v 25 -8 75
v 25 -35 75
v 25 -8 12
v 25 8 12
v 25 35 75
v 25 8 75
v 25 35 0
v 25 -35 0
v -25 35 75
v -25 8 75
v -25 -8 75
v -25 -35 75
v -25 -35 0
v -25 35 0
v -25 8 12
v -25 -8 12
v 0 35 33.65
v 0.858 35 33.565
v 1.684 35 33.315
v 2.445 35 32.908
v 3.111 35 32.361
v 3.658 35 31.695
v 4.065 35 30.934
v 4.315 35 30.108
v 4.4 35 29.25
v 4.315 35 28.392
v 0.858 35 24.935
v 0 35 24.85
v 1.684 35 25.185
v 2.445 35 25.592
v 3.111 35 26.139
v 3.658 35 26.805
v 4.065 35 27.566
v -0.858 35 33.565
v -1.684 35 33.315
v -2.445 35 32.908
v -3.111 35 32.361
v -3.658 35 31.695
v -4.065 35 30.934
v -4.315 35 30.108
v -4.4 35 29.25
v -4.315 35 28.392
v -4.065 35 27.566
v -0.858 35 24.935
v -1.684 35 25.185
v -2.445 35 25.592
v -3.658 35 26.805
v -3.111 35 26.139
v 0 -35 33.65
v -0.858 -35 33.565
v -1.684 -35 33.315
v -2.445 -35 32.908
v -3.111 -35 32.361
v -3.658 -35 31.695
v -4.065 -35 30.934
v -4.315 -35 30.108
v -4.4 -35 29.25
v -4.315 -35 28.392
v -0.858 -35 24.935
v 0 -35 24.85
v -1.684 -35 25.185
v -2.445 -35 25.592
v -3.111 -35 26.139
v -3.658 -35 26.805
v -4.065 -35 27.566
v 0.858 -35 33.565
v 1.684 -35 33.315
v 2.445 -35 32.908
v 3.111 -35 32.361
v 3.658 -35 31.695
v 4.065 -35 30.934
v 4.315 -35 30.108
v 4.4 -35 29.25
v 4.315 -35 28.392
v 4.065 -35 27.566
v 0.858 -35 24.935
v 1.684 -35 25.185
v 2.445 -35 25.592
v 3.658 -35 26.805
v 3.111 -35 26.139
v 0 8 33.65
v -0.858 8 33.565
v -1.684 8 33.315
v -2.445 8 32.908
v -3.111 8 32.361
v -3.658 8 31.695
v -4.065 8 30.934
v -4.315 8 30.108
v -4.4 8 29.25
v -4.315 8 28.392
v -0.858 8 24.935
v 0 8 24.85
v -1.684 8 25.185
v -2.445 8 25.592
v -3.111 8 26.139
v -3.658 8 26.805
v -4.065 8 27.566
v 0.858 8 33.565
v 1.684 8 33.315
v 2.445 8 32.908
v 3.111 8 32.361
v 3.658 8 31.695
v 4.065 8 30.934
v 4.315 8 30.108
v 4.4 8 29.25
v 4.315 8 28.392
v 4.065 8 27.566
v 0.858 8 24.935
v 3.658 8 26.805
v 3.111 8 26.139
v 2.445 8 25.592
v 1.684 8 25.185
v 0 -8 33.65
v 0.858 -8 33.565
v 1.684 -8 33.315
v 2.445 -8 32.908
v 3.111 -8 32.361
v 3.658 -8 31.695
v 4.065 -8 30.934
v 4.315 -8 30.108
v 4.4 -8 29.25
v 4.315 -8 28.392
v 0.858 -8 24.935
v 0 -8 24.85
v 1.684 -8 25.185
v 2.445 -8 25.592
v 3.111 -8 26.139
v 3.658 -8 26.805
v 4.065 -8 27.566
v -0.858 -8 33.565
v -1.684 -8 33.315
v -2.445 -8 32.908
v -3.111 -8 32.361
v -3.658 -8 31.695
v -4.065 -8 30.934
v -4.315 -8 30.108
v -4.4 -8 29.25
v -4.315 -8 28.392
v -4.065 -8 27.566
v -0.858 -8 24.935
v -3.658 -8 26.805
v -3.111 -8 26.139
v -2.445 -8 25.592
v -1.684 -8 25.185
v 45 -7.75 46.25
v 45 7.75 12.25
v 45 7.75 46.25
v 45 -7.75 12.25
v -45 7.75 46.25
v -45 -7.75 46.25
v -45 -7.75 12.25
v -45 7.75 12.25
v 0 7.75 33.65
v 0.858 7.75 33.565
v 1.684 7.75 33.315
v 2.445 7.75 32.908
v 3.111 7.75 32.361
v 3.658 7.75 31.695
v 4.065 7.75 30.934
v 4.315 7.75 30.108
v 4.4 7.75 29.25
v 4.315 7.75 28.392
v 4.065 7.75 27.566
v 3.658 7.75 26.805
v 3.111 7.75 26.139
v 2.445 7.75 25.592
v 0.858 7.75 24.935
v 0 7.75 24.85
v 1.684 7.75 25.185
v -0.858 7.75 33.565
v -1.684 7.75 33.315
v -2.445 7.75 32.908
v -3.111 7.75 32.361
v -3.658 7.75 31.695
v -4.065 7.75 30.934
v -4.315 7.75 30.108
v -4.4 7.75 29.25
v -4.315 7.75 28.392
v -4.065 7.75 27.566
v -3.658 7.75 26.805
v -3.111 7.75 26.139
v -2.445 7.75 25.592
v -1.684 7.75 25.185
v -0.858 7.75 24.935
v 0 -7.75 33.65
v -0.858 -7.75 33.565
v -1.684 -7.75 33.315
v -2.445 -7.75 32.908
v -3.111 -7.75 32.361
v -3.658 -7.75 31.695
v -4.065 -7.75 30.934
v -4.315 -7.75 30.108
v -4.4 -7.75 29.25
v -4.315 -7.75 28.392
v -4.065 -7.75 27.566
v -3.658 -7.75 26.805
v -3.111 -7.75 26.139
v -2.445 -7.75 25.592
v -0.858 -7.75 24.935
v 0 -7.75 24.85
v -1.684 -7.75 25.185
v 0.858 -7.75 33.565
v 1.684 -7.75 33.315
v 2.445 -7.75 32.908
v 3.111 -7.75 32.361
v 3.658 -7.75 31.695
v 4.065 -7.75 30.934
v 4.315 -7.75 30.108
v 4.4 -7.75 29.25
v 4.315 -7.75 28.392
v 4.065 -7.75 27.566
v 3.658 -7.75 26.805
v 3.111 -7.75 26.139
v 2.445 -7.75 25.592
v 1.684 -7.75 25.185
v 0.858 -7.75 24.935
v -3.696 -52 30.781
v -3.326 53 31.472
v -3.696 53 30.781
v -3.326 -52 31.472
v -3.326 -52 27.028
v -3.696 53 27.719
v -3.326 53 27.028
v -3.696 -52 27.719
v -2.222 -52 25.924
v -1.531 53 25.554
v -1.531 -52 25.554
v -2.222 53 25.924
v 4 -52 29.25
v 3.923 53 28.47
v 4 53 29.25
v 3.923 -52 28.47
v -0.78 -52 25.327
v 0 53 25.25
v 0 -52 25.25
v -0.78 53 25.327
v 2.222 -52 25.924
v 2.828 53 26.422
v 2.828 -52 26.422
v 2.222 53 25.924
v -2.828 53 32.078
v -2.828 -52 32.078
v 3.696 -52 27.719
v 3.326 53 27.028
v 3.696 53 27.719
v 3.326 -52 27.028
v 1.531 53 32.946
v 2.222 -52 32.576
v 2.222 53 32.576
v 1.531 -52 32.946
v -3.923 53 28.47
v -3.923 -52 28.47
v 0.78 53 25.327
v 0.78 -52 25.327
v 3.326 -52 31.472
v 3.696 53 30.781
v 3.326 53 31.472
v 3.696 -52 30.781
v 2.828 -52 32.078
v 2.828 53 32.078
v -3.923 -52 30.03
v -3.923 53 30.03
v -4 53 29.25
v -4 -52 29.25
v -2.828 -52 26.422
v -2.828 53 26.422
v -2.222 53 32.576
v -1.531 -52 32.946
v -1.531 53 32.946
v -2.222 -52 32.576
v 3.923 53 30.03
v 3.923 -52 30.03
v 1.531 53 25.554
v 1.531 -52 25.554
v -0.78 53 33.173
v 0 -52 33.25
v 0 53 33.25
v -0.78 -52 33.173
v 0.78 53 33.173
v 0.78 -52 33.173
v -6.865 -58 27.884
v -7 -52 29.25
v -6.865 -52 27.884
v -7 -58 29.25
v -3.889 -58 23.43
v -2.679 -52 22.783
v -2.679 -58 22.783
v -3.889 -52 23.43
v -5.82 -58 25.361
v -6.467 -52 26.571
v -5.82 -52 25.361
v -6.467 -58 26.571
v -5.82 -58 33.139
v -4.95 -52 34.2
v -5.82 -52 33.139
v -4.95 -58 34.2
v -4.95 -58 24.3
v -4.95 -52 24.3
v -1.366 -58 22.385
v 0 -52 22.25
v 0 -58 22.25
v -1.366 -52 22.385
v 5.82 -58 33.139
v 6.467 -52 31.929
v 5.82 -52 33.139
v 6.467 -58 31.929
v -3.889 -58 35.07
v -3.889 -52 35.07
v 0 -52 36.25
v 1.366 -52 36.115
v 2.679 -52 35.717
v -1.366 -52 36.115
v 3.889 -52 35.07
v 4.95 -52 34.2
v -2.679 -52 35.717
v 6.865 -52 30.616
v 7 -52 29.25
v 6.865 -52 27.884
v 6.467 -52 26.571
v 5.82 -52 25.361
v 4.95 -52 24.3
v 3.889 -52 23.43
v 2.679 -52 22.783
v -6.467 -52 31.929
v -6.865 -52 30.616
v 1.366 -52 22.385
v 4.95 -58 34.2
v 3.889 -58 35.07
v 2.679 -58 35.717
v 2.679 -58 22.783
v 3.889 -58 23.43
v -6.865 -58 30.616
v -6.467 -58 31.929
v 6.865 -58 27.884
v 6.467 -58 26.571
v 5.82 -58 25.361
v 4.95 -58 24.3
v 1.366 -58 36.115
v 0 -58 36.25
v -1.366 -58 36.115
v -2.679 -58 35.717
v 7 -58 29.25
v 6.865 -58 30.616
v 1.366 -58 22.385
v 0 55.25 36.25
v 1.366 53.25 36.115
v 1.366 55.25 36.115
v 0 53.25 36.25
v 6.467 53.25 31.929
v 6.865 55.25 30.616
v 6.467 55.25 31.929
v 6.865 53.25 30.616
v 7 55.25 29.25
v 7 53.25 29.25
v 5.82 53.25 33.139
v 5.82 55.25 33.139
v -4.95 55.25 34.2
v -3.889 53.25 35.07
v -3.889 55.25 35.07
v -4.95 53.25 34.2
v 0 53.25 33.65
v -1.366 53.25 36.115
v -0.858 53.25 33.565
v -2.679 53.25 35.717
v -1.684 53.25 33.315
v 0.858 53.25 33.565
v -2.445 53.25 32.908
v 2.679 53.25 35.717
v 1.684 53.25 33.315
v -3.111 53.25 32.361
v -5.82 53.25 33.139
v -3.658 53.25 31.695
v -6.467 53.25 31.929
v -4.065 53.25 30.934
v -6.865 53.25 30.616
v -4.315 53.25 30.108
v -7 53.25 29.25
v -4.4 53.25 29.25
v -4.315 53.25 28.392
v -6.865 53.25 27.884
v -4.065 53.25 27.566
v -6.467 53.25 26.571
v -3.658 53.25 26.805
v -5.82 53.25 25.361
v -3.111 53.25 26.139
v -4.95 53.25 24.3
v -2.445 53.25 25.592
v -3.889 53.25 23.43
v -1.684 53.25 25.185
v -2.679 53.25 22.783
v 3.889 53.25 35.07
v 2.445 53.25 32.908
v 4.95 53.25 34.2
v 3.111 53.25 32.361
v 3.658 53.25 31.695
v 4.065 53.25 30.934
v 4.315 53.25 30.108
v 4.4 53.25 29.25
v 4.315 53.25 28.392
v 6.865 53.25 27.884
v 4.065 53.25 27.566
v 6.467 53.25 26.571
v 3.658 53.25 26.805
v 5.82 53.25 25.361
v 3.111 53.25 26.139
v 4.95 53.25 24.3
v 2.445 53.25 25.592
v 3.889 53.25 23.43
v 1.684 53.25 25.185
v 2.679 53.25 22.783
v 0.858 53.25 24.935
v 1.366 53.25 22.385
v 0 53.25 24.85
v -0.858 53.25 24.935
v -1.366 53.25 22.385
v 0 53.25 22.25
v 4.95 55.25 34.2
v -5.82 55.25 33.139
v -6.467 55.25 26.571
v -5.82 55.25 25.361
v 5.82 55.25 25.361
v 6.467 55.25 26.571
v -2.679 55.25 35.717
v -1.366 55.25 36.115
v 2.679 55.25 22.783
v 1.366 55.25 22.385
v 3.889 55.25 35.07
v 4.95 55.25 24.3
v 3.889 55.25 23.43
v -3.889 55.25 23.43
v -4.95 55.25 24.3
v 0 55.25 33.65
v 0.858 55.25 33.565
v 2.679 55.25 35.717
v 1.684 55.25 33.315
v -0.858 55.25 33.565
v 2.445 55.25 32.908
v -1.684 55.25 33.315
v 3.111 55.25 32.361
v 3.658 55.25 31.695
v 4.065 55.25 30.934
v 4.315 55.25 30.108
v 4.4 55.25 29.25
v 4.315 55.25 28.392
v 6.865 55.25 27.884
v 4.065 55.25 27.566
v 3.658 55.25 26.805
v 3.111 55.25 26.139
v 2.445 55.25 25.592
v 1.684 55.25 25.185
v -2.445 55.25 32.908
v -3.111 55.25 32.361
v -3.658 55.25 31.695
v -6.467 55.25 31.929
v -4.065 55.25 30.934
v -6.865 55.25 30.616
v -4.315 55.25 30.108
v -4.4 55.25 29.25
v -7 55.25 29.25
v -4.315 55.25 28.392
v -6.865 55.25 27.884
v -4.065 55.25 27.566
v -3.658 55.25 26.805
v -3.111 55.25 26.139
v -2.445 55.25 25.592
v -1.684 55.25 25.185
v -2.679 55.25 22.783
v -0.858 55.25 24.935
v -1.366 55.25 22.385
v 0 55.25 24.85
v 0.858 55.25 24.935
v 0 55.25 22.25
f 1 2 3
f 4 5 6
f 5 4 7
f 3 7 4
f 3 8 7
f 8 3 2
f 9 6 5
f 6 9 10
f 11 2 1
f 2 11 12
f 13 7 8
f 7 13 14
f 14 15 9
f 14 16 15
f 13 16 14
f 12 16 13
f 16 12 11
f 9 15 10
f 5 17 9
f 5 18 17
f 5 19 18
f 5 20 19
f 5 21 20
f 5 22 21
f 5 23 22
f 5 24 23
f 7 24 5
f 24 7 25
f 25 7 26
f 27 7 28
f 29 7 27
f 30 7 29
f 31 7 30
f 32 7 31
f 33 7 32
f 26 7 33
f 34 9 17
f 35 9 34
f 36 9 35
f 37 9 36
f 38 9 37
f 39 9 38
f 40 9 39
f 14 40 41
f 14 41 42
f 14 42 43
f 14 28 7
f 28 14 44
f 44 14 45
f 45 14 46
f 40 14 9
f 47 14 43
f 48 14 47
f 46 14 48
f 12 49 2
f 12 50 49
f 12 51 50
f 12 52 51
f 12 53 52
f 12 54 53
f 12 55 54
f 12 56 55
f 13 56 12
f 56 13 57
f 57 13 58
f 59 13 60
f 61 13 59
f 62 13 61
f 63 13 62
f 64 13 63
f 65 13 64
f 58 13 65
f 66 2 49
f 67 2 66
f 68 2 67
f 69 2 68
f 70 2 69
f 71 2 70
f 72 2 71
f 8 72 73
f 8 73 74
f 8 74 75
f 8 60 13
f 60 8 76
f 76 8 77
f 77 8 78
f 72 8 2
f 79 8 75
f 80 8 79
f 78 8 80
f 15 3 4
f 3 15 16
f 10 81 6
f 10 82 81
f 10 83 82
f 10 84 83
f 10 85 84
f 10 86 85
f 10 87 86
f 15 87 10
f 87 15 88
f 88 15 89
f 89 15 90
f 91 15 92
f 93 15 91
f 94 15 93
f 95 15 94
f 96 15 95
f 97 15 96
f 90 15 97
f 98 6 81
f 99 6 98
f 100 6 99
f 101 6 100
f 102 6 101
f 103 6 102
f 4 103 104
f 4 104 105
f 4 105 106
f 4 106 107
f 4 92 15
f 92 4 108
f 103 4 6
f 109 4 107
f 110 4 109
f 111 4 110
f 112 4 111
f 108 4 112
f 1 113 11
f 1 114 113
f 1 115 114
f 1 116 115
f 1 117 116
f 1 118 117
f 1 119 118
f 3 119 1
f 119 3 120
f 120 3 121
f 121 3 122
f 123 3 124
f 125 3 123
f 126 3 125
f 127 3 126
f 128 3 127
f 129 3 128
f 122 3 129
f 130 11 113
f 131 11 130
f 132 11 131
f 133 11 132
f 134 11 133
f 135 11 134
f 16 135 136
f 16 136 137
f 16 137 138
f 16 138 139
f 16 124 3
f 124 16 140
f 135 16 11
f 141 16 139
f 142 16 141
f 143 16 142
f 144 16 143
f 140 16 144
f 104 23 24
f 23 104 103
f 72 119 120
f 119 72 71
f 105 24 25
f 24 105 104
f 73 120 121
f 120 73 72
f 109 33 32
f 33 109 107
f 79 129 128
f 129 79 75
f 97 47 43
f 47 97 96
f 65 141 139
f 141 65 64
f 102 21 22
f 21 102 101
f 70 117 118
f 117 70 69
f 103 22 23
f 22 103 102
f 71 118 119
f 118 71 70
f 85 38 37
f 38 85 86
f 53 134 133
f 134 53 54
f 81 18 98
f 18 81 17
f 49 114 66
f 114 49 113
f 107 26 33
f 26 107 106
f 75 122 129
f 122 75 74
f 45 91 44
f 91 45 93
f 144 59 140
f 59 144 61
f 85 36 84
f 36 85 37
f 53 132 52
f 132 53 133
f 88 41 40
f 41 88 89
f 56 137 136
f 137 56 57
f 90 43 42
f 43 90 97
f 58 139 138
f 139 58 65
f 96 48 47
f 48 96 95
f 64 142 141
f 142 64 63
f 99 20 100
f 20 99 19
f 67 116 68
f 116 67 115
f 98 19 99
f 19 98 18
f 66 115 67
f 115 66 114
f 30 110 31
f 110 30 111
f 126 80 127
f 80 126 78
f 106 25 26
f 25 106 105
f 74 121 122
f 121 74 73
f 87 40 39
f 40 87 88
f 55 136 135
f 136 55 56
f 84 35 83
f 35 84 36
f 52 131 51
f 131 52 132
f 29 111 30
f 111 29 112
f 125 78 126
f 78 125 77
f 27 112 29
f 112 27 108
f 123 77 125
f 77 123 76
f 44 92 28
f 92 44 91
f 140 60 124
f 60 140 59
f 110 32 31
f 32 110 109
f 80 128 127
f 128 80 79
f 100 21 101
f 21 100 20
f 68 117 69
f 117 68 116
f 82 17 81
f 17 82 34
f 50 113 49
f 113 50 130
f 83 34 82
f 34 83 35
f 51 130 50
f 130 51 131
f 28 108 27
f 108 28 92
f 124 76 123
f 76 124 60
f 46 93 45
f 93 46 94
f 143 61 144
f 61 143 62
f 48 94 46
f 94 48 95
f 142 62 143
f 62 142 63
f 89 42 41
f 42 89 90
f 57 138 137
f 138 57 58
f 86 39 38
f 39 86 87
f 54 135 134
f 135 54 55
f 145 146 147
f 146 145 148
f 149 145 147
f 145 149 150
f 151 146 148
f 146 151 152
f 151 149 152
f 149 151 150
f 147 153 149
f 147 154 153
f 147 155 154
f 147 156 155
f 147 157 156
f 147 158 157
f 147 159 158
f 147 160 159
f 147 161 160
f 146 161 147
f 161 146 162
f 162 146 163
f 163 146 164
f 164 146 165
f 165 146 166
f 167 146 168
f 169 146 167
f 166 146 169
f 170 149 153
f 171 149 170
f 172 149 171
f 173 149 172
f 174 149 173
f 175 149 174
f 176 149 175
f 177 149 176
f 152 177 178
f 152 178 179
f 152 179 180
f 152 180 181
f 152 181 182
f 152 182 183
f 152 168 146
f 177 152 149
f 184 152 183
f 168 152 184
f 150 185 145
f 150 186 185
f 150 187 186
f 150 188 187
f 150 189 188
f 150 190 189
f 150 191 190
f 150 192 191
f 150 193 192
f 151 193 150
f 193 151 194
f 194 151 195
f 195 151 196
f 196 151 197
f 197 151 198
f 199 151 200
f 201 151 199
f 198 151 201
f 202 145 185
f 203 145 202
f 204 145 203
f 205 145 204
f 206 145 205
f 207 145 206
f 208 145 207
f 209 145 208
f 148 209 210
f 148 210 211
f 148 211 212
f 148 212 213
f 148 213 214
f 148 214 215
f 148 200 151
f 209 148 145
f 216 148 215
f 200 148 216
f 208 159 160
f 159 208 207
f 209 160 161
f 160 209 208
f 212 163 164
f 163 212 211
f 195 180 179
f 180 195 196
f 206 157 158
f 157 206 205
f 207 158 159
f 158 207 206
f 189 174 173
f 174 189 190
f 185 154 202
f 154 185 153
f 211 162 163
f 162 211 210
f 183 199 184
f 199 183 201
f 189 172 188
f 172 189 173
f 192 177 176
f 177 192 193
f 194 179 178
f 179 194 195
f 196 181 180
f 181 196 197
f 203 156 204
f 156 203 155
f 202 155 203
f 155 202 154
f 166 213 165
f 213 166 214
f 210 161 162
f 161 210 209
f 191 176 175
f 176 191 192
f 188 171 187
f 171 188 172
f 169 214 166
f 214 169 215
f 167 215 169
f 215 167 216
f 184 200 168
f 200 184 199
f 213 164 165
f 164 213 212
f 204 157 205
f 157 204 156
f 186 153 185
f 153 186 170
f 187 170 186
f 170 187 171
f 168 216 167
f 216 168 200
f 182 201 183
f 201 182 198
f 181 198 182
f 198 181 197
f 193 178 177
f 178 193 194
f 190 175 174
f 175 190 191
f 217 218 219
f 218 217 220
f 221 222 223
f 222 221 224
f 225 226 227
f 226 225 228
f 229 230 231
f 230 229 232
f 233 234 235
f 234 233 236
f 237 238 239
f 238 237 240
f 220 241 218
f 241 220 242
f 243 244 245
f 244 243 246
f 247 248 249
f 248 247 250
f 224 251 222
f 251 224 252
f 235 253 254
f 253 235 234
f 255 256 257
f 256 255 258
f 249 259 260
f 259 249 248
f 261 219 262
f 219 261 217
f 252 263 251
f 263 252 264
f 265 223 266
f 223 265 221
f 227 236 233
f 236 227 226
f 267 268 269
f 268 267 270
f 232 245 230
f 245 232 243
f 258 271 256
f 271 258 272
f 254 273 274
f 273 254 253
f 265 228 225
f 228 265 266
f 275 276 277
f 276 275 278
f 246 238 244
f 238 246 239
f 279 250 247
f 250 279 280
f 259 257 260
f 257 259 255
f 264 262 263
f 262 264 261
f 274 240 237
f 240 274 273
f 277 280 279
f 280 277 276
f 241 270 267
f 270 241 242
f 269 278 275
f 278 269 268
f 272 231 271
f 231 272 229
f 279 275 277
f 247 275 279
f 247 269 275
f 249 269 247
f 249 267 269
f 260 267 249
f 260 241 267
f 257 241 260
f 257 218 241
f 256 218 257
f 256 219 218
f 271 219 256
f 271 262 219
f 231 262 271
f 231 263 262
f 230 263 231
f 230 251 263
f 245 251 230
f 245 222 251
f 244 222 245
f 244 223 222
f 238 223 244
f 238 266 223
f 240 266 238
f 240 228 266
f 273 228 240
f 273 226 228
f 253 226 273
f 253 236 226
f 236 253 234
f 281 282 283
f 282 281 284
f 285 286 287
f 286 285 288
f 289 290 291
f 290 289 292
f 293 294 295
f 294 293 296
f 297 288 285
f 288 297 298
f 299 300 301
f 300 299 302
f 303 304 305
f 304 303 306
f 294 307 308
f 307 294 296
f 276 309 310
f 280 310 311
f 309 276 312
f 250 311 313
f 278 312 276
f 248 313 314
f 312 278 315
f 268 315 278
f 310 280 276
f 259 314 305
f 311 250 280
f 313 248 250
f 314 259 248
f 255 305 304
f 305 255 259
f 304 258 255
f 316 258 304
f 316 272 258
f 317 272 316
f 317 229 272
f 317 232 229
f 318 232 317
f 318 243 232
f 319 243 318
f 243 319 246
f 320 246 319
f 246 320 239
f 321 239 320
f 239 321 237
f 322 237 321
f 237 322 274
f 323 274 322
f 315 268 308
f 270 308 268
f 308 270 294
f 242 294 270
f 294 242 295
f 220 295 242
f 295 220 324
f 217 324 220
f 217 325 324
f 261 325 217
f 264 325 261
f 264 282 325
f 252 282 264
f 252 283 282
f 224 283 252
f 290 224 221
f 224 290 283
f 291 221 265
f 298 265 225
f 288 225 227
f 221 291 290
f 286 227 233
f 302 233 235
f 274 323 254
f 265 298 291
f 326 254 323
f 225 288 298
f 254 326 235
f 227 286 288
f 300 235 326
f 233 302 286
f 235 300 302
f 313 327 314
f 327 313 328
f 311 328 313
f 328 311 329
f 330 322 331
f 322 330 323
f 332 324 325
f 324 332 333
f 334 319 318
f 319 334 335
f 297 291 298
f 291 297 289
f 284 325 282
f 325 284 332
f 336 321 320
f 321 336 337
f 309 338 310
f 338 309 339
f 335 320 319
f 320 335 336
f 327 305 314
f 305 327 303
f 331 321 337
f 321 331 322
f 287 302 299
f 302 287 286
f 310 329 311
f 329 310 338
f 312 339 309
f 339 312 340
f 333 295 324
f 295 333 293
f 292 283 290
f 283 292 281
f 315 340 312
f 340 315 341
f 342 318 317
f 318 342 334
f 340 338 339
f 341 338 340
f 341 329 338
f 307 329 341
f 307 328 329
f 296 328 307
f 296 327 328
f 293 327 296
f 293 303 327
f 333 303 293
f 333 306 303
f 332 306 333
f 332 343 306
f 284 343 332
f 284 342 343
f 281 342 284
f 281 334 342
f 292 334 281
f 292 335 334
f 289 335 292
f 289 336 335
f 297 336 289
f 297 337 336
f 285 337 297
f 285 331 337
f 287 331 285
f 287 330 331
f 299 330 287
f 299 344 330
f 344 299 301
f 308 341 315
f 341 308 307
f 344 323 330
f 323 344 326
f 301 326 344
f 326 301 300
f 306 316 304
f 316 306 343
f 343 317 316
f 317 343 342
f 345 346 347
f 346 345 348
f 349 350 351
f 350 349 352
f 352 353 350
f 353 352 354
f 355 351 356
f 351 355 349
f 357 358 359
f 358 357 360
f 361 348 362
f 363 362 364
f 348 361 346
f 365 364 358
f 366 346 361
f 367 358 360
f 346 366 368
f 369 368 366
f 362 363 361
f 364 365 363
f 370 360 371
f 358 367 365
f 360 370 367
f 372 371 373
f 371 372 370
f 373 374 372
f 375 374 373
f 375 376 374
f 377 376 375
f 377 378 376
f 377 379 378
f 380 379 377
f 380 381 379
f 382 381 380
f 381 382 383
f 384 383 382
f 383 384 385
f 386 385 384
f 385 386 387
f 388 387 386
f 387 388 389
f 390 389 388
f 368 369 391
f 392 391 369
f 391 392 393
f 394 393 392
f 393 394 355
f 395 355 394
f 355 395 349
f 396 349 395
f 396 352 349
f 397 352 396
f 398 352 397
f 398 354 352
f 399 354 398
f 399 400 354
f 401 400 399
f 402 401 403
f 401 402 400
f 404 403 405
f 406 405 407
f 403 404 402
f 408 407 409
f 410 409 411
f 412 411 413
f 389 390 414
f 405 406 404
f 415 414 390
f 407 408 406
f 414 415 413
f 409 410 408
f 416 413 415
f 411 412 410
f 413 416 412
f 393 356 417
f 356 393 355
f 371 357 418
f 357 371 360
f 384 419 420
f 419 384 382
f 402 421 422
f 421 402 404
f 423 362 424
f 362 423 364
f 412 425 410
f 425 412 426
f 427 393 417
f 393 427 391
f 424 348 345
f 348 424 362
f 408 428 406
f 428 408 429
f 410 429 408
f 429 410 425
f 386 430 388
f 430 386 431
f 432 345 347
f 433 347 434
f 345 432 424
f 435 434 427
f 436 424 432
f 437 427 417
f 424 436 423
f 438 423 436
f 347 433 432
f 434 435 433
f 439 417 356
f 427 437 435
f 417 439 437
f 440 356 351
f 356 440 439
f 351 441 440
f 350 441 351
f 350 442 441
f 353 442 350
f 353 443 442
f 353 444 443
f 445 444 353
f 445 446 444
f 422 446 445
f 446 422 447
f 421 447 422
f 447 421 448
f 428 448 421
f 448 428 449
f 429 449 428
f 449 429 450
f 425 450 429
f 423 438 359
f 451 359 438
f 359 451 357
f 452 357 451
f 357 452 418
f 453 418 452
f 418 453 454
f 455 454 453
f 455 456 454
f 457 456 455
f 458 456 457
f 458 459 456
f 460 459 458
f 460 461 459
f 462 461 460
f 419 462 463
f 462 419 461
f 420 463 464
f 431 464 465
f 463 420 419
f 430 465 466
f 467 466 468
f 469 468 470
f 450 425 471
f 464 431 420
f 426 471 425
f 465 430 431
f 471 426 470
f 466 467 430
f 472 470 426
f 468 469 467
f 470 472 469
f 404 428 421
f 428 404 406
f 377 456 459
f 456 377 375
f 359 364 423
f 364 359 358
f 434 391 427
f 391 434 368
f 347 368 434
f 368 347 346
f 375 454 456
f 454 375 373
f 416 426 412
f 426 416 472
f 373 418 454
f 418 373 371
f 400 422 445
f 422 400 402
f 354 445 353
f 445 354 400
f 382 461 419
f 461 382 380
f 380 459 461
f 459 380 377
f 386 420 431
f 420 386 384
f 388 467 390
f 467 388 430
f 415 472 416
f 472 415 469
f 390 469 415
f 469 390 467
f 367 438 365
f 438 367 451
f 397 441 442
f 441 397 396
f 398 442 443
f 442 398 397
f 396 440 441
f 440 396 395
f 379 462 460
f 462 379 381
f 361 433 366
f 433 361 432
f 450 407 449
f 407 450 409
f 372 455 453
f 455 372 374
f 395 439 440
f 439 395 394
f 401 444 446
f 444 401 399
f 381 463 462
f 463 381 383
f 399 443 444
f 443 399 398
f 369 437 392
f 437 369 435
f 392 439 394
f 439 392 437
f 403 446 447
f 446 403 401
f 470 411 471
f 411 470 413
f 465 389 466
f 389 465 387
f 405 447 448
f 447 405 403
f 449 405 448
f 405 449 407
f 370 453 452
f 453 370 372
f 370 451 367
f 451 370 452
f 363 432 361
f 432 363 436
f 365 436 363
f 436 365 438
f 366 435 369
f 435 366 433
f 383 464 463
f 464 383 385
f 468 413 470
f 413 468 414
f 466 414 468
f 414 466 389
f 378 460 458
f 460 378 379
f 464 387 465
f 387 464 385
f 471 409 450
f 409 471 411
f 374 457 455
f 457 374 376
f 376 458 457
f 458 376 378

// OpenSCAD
$fn = 32;

// ------------------------------------------------------------------------
// Clevis joint: 50 mm clevis, pin d8
// Every part is its own module, assembly() places them once.
// ------------------------------------------------------------------------

// --- part 1 ---
module clevis() {
  difference() {
    translate([-25, -35, 0]) cube([50, 70, 75]);
    translate([-26, -8, 12]) cube([52, 16, 64]);
    translate([0, 0, 29.25]) rotate([90, 0, 0]) cylinder(h = 72, d = 8.8, center = true);
  }
}

// --- part 2 ---
module eye() {
  difference() {
    translate([-45, -7.75, 0]) cube([90, 15.5, 34]);
    translate([0, 0, 17]) rotate([90, 0, 0]) cylinder(h = 17.5, d = 8.8, center = true);
  }
}

// --- part 3 ---
module pin() {
  rotate([0, 90, 0]) cylinder(h = 106, d = 8, center = true);
  translate([-58, 0, 0]) rotate([0, 90, 0]) cylinder(h = 6, d = 14);
}

// --- part 4 ---
module retainer() {
  difference() {
      translate([0, 0, 0]) cylinder(h = 2, d = 14);
      translate([0, 0, -1]) cylinder(h = 4, d = 8.8);
    }
}

// --- assembly ---
module assembly() {
  translate([0, 0, 0]) rotate([0, 0, 0]) clevis();
  translate([0, 0, 12.25]) rotate([0, 0, 0]) eye();
  translate([0, 0, 29.25]) rotate([0, 0, 90]) pin();
  translate([0, 55.25, 29.25]) rotate([90, 0, 0]) retainer();
}

assembly();
